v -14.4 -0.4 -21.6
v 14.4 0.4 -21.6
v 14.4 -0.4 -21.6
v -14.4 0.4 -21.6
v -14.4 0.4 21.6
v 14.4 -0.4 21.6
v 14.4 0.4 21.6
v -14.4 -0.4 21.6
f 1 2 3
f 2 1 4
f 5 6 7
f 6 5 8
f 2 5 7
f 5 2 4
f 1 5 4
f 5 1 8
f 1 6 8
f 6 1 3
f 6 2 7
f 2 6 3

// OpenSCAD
// file: ../p/box.scad
use <../lib.scad>
function ldraw_lib__box() = [
// 0 Box 6 (six faces)
// 0 Name: box.dat
// 0 Author: James Jessiman
// 0 !LDRAW_ORG Primitive UPDATE 2002-05
// 0 !LICENSE Licensed under CC BY 2.0 and CC BY 4.0 : see CAreadme.txt
// 
// 0 BFC CERTIFY CCW
  [0,"BFC","CERTIFY"],
  [0,"BFC","CCW"],
// 
// 0 !HISTORY 2002-08-22 [sbliss] Applied BFC
// 0 !HISTORY 2002-11-30 [PTadmin] Official Update 2002-05
// 0 !HISTORY 2007-06-24 [PTadmin] Header formatted for Contributor Agreement
// 0 !HISTORY 2008-07-01 [PTadmin] Official Update 2008-01
// 
// 
// 2 24 1 1 1 -1 1 1
  [2,24,1,1,1,-1,1,1],
// 2 24 -1 1 1 -1 1 -1
  [2,24,-1,1,1,-1,1,-1],
// 2 24 -1 1 -1 1 1 -1
  [2,24,-1,1,-1,1,1,-1],
// 2 24 1 1 -1 1 1 1
  [2,24,1,1,-1,1,1,1],
// 2 24 1 -1 1 -1 -1 1
  [2,24,1,-1,1,-1,-1,1],
// 2 24 -1 -1 1 -1 -1 -1
  [2,24,-1,-1,1,-1,-1,-1],
// 2 24 -1 -1 -1 1 -1 -1
  [2,24,-1,-1,-1,1,-1,-1],
// 2 24 1 -1 -1 1 -1 1
  [2,24,1,-1,-1,1,-1,1],
// 2 24 1 -1 1 1 1 1
  [2,24,1,-1,1,1,1,1],
// 2 24 -1 -1 1 -1 1 1
  [2,24,-1,-1,1,-1,1,1],
// 2 24 1 -1 -1 1 1 -1
  [2,24,1,-1,-1,1,1,-1],
// 2 24 -1 -1 -1 -1 1 -1
  [2,24,-1,-1,-1,-1,1,-1],
// 4 16 1 1 1 1 1 -1 -1 1 -1 -1 1 1
  [4,16,1,1,1,1,1,-1,-1,1,-1,-1,1,1],
// 4 16 -1 -1 -1 1 -1 -1 1 -1 1 -1 -1 1
  [4,16,-1,-1,-1,1,-1,-1,1,-1,1,-1,-1,1],
// 4 16 -1 -1 1 1 -1 1 1 1 1 -1 1 1
  [4,16,-1,-1,1,1,-1,1,1,1,1,-1,1,1],
// 4 16 -1 -1 -1 -1 -1 1 -1 1 1 -1 1 -1
  [4,16,-1,-1,-1,-1,-1,1,-1,1,1,-1,1,-1],
// 4 16 1 -1 -1 -1 -1 -1 -1 1 -1 1 1 -1
  [4,16,1,-1,-1,-1,-1,-1,-1,1,-1,1,1,-1],
// 4 16 1 -1 1 1 -1 -1 1 1 -1 1 1 1
  [4,16,1,-1,1,1,-1,-1,1,1,-1,1,1,1],
// 0
];
module ldraw_lib__box(step=0, col=false, unit=2/5, alt=false, line=0.2, solid=!$preview)
    makepoly(ldraw_lib__box(), step=step, col=col, unit=unit, alt=alt, line=line, solid=solid);
ldraw_lib__box(line=0.2);
// main file
use <../lib.scad>
use <../p/box.scad>
function ldraw_lib__954() = [
// 0 ~Glass for Window  1 x  4 x  5 with Fixed Glass
// 0 Name: 954.dat
// 0 Author: Alex Taylor [anathema]
// 0 !LDRAW_ORG Part UPDATE 2010-02
// 0 !LICENSE Licensed under CC BY 2.0 and CC BY 4.0 : see CAreadme.txt
// 
// 0 BFC CERTIFY CCW
  [0,"BFC","CERTIFY"],
  [0,"BFC","CCW"],
// 
// 0 !HISTORY 2010-07-05 [PTadmin] Official Update 2010-02
// 
// 
// 1 16 0 0 0 36 0 0 0 54 0 0 0 1 box.dat
  [1,16,0,0,0,36,0,0,0,54,0,0,0,1, ldraw_lib__box()],
// 0
];
module ldraw_lib__954(step=0, col=false, unit=2/5, alt=false, line=0.2, solid=!$preview)
    makepoly(ldraw_lib__954(), step=step, col=col, unit=unit, alt=alt, line=line, solid=solid);
ldraw_lib__954(line=0.2);
